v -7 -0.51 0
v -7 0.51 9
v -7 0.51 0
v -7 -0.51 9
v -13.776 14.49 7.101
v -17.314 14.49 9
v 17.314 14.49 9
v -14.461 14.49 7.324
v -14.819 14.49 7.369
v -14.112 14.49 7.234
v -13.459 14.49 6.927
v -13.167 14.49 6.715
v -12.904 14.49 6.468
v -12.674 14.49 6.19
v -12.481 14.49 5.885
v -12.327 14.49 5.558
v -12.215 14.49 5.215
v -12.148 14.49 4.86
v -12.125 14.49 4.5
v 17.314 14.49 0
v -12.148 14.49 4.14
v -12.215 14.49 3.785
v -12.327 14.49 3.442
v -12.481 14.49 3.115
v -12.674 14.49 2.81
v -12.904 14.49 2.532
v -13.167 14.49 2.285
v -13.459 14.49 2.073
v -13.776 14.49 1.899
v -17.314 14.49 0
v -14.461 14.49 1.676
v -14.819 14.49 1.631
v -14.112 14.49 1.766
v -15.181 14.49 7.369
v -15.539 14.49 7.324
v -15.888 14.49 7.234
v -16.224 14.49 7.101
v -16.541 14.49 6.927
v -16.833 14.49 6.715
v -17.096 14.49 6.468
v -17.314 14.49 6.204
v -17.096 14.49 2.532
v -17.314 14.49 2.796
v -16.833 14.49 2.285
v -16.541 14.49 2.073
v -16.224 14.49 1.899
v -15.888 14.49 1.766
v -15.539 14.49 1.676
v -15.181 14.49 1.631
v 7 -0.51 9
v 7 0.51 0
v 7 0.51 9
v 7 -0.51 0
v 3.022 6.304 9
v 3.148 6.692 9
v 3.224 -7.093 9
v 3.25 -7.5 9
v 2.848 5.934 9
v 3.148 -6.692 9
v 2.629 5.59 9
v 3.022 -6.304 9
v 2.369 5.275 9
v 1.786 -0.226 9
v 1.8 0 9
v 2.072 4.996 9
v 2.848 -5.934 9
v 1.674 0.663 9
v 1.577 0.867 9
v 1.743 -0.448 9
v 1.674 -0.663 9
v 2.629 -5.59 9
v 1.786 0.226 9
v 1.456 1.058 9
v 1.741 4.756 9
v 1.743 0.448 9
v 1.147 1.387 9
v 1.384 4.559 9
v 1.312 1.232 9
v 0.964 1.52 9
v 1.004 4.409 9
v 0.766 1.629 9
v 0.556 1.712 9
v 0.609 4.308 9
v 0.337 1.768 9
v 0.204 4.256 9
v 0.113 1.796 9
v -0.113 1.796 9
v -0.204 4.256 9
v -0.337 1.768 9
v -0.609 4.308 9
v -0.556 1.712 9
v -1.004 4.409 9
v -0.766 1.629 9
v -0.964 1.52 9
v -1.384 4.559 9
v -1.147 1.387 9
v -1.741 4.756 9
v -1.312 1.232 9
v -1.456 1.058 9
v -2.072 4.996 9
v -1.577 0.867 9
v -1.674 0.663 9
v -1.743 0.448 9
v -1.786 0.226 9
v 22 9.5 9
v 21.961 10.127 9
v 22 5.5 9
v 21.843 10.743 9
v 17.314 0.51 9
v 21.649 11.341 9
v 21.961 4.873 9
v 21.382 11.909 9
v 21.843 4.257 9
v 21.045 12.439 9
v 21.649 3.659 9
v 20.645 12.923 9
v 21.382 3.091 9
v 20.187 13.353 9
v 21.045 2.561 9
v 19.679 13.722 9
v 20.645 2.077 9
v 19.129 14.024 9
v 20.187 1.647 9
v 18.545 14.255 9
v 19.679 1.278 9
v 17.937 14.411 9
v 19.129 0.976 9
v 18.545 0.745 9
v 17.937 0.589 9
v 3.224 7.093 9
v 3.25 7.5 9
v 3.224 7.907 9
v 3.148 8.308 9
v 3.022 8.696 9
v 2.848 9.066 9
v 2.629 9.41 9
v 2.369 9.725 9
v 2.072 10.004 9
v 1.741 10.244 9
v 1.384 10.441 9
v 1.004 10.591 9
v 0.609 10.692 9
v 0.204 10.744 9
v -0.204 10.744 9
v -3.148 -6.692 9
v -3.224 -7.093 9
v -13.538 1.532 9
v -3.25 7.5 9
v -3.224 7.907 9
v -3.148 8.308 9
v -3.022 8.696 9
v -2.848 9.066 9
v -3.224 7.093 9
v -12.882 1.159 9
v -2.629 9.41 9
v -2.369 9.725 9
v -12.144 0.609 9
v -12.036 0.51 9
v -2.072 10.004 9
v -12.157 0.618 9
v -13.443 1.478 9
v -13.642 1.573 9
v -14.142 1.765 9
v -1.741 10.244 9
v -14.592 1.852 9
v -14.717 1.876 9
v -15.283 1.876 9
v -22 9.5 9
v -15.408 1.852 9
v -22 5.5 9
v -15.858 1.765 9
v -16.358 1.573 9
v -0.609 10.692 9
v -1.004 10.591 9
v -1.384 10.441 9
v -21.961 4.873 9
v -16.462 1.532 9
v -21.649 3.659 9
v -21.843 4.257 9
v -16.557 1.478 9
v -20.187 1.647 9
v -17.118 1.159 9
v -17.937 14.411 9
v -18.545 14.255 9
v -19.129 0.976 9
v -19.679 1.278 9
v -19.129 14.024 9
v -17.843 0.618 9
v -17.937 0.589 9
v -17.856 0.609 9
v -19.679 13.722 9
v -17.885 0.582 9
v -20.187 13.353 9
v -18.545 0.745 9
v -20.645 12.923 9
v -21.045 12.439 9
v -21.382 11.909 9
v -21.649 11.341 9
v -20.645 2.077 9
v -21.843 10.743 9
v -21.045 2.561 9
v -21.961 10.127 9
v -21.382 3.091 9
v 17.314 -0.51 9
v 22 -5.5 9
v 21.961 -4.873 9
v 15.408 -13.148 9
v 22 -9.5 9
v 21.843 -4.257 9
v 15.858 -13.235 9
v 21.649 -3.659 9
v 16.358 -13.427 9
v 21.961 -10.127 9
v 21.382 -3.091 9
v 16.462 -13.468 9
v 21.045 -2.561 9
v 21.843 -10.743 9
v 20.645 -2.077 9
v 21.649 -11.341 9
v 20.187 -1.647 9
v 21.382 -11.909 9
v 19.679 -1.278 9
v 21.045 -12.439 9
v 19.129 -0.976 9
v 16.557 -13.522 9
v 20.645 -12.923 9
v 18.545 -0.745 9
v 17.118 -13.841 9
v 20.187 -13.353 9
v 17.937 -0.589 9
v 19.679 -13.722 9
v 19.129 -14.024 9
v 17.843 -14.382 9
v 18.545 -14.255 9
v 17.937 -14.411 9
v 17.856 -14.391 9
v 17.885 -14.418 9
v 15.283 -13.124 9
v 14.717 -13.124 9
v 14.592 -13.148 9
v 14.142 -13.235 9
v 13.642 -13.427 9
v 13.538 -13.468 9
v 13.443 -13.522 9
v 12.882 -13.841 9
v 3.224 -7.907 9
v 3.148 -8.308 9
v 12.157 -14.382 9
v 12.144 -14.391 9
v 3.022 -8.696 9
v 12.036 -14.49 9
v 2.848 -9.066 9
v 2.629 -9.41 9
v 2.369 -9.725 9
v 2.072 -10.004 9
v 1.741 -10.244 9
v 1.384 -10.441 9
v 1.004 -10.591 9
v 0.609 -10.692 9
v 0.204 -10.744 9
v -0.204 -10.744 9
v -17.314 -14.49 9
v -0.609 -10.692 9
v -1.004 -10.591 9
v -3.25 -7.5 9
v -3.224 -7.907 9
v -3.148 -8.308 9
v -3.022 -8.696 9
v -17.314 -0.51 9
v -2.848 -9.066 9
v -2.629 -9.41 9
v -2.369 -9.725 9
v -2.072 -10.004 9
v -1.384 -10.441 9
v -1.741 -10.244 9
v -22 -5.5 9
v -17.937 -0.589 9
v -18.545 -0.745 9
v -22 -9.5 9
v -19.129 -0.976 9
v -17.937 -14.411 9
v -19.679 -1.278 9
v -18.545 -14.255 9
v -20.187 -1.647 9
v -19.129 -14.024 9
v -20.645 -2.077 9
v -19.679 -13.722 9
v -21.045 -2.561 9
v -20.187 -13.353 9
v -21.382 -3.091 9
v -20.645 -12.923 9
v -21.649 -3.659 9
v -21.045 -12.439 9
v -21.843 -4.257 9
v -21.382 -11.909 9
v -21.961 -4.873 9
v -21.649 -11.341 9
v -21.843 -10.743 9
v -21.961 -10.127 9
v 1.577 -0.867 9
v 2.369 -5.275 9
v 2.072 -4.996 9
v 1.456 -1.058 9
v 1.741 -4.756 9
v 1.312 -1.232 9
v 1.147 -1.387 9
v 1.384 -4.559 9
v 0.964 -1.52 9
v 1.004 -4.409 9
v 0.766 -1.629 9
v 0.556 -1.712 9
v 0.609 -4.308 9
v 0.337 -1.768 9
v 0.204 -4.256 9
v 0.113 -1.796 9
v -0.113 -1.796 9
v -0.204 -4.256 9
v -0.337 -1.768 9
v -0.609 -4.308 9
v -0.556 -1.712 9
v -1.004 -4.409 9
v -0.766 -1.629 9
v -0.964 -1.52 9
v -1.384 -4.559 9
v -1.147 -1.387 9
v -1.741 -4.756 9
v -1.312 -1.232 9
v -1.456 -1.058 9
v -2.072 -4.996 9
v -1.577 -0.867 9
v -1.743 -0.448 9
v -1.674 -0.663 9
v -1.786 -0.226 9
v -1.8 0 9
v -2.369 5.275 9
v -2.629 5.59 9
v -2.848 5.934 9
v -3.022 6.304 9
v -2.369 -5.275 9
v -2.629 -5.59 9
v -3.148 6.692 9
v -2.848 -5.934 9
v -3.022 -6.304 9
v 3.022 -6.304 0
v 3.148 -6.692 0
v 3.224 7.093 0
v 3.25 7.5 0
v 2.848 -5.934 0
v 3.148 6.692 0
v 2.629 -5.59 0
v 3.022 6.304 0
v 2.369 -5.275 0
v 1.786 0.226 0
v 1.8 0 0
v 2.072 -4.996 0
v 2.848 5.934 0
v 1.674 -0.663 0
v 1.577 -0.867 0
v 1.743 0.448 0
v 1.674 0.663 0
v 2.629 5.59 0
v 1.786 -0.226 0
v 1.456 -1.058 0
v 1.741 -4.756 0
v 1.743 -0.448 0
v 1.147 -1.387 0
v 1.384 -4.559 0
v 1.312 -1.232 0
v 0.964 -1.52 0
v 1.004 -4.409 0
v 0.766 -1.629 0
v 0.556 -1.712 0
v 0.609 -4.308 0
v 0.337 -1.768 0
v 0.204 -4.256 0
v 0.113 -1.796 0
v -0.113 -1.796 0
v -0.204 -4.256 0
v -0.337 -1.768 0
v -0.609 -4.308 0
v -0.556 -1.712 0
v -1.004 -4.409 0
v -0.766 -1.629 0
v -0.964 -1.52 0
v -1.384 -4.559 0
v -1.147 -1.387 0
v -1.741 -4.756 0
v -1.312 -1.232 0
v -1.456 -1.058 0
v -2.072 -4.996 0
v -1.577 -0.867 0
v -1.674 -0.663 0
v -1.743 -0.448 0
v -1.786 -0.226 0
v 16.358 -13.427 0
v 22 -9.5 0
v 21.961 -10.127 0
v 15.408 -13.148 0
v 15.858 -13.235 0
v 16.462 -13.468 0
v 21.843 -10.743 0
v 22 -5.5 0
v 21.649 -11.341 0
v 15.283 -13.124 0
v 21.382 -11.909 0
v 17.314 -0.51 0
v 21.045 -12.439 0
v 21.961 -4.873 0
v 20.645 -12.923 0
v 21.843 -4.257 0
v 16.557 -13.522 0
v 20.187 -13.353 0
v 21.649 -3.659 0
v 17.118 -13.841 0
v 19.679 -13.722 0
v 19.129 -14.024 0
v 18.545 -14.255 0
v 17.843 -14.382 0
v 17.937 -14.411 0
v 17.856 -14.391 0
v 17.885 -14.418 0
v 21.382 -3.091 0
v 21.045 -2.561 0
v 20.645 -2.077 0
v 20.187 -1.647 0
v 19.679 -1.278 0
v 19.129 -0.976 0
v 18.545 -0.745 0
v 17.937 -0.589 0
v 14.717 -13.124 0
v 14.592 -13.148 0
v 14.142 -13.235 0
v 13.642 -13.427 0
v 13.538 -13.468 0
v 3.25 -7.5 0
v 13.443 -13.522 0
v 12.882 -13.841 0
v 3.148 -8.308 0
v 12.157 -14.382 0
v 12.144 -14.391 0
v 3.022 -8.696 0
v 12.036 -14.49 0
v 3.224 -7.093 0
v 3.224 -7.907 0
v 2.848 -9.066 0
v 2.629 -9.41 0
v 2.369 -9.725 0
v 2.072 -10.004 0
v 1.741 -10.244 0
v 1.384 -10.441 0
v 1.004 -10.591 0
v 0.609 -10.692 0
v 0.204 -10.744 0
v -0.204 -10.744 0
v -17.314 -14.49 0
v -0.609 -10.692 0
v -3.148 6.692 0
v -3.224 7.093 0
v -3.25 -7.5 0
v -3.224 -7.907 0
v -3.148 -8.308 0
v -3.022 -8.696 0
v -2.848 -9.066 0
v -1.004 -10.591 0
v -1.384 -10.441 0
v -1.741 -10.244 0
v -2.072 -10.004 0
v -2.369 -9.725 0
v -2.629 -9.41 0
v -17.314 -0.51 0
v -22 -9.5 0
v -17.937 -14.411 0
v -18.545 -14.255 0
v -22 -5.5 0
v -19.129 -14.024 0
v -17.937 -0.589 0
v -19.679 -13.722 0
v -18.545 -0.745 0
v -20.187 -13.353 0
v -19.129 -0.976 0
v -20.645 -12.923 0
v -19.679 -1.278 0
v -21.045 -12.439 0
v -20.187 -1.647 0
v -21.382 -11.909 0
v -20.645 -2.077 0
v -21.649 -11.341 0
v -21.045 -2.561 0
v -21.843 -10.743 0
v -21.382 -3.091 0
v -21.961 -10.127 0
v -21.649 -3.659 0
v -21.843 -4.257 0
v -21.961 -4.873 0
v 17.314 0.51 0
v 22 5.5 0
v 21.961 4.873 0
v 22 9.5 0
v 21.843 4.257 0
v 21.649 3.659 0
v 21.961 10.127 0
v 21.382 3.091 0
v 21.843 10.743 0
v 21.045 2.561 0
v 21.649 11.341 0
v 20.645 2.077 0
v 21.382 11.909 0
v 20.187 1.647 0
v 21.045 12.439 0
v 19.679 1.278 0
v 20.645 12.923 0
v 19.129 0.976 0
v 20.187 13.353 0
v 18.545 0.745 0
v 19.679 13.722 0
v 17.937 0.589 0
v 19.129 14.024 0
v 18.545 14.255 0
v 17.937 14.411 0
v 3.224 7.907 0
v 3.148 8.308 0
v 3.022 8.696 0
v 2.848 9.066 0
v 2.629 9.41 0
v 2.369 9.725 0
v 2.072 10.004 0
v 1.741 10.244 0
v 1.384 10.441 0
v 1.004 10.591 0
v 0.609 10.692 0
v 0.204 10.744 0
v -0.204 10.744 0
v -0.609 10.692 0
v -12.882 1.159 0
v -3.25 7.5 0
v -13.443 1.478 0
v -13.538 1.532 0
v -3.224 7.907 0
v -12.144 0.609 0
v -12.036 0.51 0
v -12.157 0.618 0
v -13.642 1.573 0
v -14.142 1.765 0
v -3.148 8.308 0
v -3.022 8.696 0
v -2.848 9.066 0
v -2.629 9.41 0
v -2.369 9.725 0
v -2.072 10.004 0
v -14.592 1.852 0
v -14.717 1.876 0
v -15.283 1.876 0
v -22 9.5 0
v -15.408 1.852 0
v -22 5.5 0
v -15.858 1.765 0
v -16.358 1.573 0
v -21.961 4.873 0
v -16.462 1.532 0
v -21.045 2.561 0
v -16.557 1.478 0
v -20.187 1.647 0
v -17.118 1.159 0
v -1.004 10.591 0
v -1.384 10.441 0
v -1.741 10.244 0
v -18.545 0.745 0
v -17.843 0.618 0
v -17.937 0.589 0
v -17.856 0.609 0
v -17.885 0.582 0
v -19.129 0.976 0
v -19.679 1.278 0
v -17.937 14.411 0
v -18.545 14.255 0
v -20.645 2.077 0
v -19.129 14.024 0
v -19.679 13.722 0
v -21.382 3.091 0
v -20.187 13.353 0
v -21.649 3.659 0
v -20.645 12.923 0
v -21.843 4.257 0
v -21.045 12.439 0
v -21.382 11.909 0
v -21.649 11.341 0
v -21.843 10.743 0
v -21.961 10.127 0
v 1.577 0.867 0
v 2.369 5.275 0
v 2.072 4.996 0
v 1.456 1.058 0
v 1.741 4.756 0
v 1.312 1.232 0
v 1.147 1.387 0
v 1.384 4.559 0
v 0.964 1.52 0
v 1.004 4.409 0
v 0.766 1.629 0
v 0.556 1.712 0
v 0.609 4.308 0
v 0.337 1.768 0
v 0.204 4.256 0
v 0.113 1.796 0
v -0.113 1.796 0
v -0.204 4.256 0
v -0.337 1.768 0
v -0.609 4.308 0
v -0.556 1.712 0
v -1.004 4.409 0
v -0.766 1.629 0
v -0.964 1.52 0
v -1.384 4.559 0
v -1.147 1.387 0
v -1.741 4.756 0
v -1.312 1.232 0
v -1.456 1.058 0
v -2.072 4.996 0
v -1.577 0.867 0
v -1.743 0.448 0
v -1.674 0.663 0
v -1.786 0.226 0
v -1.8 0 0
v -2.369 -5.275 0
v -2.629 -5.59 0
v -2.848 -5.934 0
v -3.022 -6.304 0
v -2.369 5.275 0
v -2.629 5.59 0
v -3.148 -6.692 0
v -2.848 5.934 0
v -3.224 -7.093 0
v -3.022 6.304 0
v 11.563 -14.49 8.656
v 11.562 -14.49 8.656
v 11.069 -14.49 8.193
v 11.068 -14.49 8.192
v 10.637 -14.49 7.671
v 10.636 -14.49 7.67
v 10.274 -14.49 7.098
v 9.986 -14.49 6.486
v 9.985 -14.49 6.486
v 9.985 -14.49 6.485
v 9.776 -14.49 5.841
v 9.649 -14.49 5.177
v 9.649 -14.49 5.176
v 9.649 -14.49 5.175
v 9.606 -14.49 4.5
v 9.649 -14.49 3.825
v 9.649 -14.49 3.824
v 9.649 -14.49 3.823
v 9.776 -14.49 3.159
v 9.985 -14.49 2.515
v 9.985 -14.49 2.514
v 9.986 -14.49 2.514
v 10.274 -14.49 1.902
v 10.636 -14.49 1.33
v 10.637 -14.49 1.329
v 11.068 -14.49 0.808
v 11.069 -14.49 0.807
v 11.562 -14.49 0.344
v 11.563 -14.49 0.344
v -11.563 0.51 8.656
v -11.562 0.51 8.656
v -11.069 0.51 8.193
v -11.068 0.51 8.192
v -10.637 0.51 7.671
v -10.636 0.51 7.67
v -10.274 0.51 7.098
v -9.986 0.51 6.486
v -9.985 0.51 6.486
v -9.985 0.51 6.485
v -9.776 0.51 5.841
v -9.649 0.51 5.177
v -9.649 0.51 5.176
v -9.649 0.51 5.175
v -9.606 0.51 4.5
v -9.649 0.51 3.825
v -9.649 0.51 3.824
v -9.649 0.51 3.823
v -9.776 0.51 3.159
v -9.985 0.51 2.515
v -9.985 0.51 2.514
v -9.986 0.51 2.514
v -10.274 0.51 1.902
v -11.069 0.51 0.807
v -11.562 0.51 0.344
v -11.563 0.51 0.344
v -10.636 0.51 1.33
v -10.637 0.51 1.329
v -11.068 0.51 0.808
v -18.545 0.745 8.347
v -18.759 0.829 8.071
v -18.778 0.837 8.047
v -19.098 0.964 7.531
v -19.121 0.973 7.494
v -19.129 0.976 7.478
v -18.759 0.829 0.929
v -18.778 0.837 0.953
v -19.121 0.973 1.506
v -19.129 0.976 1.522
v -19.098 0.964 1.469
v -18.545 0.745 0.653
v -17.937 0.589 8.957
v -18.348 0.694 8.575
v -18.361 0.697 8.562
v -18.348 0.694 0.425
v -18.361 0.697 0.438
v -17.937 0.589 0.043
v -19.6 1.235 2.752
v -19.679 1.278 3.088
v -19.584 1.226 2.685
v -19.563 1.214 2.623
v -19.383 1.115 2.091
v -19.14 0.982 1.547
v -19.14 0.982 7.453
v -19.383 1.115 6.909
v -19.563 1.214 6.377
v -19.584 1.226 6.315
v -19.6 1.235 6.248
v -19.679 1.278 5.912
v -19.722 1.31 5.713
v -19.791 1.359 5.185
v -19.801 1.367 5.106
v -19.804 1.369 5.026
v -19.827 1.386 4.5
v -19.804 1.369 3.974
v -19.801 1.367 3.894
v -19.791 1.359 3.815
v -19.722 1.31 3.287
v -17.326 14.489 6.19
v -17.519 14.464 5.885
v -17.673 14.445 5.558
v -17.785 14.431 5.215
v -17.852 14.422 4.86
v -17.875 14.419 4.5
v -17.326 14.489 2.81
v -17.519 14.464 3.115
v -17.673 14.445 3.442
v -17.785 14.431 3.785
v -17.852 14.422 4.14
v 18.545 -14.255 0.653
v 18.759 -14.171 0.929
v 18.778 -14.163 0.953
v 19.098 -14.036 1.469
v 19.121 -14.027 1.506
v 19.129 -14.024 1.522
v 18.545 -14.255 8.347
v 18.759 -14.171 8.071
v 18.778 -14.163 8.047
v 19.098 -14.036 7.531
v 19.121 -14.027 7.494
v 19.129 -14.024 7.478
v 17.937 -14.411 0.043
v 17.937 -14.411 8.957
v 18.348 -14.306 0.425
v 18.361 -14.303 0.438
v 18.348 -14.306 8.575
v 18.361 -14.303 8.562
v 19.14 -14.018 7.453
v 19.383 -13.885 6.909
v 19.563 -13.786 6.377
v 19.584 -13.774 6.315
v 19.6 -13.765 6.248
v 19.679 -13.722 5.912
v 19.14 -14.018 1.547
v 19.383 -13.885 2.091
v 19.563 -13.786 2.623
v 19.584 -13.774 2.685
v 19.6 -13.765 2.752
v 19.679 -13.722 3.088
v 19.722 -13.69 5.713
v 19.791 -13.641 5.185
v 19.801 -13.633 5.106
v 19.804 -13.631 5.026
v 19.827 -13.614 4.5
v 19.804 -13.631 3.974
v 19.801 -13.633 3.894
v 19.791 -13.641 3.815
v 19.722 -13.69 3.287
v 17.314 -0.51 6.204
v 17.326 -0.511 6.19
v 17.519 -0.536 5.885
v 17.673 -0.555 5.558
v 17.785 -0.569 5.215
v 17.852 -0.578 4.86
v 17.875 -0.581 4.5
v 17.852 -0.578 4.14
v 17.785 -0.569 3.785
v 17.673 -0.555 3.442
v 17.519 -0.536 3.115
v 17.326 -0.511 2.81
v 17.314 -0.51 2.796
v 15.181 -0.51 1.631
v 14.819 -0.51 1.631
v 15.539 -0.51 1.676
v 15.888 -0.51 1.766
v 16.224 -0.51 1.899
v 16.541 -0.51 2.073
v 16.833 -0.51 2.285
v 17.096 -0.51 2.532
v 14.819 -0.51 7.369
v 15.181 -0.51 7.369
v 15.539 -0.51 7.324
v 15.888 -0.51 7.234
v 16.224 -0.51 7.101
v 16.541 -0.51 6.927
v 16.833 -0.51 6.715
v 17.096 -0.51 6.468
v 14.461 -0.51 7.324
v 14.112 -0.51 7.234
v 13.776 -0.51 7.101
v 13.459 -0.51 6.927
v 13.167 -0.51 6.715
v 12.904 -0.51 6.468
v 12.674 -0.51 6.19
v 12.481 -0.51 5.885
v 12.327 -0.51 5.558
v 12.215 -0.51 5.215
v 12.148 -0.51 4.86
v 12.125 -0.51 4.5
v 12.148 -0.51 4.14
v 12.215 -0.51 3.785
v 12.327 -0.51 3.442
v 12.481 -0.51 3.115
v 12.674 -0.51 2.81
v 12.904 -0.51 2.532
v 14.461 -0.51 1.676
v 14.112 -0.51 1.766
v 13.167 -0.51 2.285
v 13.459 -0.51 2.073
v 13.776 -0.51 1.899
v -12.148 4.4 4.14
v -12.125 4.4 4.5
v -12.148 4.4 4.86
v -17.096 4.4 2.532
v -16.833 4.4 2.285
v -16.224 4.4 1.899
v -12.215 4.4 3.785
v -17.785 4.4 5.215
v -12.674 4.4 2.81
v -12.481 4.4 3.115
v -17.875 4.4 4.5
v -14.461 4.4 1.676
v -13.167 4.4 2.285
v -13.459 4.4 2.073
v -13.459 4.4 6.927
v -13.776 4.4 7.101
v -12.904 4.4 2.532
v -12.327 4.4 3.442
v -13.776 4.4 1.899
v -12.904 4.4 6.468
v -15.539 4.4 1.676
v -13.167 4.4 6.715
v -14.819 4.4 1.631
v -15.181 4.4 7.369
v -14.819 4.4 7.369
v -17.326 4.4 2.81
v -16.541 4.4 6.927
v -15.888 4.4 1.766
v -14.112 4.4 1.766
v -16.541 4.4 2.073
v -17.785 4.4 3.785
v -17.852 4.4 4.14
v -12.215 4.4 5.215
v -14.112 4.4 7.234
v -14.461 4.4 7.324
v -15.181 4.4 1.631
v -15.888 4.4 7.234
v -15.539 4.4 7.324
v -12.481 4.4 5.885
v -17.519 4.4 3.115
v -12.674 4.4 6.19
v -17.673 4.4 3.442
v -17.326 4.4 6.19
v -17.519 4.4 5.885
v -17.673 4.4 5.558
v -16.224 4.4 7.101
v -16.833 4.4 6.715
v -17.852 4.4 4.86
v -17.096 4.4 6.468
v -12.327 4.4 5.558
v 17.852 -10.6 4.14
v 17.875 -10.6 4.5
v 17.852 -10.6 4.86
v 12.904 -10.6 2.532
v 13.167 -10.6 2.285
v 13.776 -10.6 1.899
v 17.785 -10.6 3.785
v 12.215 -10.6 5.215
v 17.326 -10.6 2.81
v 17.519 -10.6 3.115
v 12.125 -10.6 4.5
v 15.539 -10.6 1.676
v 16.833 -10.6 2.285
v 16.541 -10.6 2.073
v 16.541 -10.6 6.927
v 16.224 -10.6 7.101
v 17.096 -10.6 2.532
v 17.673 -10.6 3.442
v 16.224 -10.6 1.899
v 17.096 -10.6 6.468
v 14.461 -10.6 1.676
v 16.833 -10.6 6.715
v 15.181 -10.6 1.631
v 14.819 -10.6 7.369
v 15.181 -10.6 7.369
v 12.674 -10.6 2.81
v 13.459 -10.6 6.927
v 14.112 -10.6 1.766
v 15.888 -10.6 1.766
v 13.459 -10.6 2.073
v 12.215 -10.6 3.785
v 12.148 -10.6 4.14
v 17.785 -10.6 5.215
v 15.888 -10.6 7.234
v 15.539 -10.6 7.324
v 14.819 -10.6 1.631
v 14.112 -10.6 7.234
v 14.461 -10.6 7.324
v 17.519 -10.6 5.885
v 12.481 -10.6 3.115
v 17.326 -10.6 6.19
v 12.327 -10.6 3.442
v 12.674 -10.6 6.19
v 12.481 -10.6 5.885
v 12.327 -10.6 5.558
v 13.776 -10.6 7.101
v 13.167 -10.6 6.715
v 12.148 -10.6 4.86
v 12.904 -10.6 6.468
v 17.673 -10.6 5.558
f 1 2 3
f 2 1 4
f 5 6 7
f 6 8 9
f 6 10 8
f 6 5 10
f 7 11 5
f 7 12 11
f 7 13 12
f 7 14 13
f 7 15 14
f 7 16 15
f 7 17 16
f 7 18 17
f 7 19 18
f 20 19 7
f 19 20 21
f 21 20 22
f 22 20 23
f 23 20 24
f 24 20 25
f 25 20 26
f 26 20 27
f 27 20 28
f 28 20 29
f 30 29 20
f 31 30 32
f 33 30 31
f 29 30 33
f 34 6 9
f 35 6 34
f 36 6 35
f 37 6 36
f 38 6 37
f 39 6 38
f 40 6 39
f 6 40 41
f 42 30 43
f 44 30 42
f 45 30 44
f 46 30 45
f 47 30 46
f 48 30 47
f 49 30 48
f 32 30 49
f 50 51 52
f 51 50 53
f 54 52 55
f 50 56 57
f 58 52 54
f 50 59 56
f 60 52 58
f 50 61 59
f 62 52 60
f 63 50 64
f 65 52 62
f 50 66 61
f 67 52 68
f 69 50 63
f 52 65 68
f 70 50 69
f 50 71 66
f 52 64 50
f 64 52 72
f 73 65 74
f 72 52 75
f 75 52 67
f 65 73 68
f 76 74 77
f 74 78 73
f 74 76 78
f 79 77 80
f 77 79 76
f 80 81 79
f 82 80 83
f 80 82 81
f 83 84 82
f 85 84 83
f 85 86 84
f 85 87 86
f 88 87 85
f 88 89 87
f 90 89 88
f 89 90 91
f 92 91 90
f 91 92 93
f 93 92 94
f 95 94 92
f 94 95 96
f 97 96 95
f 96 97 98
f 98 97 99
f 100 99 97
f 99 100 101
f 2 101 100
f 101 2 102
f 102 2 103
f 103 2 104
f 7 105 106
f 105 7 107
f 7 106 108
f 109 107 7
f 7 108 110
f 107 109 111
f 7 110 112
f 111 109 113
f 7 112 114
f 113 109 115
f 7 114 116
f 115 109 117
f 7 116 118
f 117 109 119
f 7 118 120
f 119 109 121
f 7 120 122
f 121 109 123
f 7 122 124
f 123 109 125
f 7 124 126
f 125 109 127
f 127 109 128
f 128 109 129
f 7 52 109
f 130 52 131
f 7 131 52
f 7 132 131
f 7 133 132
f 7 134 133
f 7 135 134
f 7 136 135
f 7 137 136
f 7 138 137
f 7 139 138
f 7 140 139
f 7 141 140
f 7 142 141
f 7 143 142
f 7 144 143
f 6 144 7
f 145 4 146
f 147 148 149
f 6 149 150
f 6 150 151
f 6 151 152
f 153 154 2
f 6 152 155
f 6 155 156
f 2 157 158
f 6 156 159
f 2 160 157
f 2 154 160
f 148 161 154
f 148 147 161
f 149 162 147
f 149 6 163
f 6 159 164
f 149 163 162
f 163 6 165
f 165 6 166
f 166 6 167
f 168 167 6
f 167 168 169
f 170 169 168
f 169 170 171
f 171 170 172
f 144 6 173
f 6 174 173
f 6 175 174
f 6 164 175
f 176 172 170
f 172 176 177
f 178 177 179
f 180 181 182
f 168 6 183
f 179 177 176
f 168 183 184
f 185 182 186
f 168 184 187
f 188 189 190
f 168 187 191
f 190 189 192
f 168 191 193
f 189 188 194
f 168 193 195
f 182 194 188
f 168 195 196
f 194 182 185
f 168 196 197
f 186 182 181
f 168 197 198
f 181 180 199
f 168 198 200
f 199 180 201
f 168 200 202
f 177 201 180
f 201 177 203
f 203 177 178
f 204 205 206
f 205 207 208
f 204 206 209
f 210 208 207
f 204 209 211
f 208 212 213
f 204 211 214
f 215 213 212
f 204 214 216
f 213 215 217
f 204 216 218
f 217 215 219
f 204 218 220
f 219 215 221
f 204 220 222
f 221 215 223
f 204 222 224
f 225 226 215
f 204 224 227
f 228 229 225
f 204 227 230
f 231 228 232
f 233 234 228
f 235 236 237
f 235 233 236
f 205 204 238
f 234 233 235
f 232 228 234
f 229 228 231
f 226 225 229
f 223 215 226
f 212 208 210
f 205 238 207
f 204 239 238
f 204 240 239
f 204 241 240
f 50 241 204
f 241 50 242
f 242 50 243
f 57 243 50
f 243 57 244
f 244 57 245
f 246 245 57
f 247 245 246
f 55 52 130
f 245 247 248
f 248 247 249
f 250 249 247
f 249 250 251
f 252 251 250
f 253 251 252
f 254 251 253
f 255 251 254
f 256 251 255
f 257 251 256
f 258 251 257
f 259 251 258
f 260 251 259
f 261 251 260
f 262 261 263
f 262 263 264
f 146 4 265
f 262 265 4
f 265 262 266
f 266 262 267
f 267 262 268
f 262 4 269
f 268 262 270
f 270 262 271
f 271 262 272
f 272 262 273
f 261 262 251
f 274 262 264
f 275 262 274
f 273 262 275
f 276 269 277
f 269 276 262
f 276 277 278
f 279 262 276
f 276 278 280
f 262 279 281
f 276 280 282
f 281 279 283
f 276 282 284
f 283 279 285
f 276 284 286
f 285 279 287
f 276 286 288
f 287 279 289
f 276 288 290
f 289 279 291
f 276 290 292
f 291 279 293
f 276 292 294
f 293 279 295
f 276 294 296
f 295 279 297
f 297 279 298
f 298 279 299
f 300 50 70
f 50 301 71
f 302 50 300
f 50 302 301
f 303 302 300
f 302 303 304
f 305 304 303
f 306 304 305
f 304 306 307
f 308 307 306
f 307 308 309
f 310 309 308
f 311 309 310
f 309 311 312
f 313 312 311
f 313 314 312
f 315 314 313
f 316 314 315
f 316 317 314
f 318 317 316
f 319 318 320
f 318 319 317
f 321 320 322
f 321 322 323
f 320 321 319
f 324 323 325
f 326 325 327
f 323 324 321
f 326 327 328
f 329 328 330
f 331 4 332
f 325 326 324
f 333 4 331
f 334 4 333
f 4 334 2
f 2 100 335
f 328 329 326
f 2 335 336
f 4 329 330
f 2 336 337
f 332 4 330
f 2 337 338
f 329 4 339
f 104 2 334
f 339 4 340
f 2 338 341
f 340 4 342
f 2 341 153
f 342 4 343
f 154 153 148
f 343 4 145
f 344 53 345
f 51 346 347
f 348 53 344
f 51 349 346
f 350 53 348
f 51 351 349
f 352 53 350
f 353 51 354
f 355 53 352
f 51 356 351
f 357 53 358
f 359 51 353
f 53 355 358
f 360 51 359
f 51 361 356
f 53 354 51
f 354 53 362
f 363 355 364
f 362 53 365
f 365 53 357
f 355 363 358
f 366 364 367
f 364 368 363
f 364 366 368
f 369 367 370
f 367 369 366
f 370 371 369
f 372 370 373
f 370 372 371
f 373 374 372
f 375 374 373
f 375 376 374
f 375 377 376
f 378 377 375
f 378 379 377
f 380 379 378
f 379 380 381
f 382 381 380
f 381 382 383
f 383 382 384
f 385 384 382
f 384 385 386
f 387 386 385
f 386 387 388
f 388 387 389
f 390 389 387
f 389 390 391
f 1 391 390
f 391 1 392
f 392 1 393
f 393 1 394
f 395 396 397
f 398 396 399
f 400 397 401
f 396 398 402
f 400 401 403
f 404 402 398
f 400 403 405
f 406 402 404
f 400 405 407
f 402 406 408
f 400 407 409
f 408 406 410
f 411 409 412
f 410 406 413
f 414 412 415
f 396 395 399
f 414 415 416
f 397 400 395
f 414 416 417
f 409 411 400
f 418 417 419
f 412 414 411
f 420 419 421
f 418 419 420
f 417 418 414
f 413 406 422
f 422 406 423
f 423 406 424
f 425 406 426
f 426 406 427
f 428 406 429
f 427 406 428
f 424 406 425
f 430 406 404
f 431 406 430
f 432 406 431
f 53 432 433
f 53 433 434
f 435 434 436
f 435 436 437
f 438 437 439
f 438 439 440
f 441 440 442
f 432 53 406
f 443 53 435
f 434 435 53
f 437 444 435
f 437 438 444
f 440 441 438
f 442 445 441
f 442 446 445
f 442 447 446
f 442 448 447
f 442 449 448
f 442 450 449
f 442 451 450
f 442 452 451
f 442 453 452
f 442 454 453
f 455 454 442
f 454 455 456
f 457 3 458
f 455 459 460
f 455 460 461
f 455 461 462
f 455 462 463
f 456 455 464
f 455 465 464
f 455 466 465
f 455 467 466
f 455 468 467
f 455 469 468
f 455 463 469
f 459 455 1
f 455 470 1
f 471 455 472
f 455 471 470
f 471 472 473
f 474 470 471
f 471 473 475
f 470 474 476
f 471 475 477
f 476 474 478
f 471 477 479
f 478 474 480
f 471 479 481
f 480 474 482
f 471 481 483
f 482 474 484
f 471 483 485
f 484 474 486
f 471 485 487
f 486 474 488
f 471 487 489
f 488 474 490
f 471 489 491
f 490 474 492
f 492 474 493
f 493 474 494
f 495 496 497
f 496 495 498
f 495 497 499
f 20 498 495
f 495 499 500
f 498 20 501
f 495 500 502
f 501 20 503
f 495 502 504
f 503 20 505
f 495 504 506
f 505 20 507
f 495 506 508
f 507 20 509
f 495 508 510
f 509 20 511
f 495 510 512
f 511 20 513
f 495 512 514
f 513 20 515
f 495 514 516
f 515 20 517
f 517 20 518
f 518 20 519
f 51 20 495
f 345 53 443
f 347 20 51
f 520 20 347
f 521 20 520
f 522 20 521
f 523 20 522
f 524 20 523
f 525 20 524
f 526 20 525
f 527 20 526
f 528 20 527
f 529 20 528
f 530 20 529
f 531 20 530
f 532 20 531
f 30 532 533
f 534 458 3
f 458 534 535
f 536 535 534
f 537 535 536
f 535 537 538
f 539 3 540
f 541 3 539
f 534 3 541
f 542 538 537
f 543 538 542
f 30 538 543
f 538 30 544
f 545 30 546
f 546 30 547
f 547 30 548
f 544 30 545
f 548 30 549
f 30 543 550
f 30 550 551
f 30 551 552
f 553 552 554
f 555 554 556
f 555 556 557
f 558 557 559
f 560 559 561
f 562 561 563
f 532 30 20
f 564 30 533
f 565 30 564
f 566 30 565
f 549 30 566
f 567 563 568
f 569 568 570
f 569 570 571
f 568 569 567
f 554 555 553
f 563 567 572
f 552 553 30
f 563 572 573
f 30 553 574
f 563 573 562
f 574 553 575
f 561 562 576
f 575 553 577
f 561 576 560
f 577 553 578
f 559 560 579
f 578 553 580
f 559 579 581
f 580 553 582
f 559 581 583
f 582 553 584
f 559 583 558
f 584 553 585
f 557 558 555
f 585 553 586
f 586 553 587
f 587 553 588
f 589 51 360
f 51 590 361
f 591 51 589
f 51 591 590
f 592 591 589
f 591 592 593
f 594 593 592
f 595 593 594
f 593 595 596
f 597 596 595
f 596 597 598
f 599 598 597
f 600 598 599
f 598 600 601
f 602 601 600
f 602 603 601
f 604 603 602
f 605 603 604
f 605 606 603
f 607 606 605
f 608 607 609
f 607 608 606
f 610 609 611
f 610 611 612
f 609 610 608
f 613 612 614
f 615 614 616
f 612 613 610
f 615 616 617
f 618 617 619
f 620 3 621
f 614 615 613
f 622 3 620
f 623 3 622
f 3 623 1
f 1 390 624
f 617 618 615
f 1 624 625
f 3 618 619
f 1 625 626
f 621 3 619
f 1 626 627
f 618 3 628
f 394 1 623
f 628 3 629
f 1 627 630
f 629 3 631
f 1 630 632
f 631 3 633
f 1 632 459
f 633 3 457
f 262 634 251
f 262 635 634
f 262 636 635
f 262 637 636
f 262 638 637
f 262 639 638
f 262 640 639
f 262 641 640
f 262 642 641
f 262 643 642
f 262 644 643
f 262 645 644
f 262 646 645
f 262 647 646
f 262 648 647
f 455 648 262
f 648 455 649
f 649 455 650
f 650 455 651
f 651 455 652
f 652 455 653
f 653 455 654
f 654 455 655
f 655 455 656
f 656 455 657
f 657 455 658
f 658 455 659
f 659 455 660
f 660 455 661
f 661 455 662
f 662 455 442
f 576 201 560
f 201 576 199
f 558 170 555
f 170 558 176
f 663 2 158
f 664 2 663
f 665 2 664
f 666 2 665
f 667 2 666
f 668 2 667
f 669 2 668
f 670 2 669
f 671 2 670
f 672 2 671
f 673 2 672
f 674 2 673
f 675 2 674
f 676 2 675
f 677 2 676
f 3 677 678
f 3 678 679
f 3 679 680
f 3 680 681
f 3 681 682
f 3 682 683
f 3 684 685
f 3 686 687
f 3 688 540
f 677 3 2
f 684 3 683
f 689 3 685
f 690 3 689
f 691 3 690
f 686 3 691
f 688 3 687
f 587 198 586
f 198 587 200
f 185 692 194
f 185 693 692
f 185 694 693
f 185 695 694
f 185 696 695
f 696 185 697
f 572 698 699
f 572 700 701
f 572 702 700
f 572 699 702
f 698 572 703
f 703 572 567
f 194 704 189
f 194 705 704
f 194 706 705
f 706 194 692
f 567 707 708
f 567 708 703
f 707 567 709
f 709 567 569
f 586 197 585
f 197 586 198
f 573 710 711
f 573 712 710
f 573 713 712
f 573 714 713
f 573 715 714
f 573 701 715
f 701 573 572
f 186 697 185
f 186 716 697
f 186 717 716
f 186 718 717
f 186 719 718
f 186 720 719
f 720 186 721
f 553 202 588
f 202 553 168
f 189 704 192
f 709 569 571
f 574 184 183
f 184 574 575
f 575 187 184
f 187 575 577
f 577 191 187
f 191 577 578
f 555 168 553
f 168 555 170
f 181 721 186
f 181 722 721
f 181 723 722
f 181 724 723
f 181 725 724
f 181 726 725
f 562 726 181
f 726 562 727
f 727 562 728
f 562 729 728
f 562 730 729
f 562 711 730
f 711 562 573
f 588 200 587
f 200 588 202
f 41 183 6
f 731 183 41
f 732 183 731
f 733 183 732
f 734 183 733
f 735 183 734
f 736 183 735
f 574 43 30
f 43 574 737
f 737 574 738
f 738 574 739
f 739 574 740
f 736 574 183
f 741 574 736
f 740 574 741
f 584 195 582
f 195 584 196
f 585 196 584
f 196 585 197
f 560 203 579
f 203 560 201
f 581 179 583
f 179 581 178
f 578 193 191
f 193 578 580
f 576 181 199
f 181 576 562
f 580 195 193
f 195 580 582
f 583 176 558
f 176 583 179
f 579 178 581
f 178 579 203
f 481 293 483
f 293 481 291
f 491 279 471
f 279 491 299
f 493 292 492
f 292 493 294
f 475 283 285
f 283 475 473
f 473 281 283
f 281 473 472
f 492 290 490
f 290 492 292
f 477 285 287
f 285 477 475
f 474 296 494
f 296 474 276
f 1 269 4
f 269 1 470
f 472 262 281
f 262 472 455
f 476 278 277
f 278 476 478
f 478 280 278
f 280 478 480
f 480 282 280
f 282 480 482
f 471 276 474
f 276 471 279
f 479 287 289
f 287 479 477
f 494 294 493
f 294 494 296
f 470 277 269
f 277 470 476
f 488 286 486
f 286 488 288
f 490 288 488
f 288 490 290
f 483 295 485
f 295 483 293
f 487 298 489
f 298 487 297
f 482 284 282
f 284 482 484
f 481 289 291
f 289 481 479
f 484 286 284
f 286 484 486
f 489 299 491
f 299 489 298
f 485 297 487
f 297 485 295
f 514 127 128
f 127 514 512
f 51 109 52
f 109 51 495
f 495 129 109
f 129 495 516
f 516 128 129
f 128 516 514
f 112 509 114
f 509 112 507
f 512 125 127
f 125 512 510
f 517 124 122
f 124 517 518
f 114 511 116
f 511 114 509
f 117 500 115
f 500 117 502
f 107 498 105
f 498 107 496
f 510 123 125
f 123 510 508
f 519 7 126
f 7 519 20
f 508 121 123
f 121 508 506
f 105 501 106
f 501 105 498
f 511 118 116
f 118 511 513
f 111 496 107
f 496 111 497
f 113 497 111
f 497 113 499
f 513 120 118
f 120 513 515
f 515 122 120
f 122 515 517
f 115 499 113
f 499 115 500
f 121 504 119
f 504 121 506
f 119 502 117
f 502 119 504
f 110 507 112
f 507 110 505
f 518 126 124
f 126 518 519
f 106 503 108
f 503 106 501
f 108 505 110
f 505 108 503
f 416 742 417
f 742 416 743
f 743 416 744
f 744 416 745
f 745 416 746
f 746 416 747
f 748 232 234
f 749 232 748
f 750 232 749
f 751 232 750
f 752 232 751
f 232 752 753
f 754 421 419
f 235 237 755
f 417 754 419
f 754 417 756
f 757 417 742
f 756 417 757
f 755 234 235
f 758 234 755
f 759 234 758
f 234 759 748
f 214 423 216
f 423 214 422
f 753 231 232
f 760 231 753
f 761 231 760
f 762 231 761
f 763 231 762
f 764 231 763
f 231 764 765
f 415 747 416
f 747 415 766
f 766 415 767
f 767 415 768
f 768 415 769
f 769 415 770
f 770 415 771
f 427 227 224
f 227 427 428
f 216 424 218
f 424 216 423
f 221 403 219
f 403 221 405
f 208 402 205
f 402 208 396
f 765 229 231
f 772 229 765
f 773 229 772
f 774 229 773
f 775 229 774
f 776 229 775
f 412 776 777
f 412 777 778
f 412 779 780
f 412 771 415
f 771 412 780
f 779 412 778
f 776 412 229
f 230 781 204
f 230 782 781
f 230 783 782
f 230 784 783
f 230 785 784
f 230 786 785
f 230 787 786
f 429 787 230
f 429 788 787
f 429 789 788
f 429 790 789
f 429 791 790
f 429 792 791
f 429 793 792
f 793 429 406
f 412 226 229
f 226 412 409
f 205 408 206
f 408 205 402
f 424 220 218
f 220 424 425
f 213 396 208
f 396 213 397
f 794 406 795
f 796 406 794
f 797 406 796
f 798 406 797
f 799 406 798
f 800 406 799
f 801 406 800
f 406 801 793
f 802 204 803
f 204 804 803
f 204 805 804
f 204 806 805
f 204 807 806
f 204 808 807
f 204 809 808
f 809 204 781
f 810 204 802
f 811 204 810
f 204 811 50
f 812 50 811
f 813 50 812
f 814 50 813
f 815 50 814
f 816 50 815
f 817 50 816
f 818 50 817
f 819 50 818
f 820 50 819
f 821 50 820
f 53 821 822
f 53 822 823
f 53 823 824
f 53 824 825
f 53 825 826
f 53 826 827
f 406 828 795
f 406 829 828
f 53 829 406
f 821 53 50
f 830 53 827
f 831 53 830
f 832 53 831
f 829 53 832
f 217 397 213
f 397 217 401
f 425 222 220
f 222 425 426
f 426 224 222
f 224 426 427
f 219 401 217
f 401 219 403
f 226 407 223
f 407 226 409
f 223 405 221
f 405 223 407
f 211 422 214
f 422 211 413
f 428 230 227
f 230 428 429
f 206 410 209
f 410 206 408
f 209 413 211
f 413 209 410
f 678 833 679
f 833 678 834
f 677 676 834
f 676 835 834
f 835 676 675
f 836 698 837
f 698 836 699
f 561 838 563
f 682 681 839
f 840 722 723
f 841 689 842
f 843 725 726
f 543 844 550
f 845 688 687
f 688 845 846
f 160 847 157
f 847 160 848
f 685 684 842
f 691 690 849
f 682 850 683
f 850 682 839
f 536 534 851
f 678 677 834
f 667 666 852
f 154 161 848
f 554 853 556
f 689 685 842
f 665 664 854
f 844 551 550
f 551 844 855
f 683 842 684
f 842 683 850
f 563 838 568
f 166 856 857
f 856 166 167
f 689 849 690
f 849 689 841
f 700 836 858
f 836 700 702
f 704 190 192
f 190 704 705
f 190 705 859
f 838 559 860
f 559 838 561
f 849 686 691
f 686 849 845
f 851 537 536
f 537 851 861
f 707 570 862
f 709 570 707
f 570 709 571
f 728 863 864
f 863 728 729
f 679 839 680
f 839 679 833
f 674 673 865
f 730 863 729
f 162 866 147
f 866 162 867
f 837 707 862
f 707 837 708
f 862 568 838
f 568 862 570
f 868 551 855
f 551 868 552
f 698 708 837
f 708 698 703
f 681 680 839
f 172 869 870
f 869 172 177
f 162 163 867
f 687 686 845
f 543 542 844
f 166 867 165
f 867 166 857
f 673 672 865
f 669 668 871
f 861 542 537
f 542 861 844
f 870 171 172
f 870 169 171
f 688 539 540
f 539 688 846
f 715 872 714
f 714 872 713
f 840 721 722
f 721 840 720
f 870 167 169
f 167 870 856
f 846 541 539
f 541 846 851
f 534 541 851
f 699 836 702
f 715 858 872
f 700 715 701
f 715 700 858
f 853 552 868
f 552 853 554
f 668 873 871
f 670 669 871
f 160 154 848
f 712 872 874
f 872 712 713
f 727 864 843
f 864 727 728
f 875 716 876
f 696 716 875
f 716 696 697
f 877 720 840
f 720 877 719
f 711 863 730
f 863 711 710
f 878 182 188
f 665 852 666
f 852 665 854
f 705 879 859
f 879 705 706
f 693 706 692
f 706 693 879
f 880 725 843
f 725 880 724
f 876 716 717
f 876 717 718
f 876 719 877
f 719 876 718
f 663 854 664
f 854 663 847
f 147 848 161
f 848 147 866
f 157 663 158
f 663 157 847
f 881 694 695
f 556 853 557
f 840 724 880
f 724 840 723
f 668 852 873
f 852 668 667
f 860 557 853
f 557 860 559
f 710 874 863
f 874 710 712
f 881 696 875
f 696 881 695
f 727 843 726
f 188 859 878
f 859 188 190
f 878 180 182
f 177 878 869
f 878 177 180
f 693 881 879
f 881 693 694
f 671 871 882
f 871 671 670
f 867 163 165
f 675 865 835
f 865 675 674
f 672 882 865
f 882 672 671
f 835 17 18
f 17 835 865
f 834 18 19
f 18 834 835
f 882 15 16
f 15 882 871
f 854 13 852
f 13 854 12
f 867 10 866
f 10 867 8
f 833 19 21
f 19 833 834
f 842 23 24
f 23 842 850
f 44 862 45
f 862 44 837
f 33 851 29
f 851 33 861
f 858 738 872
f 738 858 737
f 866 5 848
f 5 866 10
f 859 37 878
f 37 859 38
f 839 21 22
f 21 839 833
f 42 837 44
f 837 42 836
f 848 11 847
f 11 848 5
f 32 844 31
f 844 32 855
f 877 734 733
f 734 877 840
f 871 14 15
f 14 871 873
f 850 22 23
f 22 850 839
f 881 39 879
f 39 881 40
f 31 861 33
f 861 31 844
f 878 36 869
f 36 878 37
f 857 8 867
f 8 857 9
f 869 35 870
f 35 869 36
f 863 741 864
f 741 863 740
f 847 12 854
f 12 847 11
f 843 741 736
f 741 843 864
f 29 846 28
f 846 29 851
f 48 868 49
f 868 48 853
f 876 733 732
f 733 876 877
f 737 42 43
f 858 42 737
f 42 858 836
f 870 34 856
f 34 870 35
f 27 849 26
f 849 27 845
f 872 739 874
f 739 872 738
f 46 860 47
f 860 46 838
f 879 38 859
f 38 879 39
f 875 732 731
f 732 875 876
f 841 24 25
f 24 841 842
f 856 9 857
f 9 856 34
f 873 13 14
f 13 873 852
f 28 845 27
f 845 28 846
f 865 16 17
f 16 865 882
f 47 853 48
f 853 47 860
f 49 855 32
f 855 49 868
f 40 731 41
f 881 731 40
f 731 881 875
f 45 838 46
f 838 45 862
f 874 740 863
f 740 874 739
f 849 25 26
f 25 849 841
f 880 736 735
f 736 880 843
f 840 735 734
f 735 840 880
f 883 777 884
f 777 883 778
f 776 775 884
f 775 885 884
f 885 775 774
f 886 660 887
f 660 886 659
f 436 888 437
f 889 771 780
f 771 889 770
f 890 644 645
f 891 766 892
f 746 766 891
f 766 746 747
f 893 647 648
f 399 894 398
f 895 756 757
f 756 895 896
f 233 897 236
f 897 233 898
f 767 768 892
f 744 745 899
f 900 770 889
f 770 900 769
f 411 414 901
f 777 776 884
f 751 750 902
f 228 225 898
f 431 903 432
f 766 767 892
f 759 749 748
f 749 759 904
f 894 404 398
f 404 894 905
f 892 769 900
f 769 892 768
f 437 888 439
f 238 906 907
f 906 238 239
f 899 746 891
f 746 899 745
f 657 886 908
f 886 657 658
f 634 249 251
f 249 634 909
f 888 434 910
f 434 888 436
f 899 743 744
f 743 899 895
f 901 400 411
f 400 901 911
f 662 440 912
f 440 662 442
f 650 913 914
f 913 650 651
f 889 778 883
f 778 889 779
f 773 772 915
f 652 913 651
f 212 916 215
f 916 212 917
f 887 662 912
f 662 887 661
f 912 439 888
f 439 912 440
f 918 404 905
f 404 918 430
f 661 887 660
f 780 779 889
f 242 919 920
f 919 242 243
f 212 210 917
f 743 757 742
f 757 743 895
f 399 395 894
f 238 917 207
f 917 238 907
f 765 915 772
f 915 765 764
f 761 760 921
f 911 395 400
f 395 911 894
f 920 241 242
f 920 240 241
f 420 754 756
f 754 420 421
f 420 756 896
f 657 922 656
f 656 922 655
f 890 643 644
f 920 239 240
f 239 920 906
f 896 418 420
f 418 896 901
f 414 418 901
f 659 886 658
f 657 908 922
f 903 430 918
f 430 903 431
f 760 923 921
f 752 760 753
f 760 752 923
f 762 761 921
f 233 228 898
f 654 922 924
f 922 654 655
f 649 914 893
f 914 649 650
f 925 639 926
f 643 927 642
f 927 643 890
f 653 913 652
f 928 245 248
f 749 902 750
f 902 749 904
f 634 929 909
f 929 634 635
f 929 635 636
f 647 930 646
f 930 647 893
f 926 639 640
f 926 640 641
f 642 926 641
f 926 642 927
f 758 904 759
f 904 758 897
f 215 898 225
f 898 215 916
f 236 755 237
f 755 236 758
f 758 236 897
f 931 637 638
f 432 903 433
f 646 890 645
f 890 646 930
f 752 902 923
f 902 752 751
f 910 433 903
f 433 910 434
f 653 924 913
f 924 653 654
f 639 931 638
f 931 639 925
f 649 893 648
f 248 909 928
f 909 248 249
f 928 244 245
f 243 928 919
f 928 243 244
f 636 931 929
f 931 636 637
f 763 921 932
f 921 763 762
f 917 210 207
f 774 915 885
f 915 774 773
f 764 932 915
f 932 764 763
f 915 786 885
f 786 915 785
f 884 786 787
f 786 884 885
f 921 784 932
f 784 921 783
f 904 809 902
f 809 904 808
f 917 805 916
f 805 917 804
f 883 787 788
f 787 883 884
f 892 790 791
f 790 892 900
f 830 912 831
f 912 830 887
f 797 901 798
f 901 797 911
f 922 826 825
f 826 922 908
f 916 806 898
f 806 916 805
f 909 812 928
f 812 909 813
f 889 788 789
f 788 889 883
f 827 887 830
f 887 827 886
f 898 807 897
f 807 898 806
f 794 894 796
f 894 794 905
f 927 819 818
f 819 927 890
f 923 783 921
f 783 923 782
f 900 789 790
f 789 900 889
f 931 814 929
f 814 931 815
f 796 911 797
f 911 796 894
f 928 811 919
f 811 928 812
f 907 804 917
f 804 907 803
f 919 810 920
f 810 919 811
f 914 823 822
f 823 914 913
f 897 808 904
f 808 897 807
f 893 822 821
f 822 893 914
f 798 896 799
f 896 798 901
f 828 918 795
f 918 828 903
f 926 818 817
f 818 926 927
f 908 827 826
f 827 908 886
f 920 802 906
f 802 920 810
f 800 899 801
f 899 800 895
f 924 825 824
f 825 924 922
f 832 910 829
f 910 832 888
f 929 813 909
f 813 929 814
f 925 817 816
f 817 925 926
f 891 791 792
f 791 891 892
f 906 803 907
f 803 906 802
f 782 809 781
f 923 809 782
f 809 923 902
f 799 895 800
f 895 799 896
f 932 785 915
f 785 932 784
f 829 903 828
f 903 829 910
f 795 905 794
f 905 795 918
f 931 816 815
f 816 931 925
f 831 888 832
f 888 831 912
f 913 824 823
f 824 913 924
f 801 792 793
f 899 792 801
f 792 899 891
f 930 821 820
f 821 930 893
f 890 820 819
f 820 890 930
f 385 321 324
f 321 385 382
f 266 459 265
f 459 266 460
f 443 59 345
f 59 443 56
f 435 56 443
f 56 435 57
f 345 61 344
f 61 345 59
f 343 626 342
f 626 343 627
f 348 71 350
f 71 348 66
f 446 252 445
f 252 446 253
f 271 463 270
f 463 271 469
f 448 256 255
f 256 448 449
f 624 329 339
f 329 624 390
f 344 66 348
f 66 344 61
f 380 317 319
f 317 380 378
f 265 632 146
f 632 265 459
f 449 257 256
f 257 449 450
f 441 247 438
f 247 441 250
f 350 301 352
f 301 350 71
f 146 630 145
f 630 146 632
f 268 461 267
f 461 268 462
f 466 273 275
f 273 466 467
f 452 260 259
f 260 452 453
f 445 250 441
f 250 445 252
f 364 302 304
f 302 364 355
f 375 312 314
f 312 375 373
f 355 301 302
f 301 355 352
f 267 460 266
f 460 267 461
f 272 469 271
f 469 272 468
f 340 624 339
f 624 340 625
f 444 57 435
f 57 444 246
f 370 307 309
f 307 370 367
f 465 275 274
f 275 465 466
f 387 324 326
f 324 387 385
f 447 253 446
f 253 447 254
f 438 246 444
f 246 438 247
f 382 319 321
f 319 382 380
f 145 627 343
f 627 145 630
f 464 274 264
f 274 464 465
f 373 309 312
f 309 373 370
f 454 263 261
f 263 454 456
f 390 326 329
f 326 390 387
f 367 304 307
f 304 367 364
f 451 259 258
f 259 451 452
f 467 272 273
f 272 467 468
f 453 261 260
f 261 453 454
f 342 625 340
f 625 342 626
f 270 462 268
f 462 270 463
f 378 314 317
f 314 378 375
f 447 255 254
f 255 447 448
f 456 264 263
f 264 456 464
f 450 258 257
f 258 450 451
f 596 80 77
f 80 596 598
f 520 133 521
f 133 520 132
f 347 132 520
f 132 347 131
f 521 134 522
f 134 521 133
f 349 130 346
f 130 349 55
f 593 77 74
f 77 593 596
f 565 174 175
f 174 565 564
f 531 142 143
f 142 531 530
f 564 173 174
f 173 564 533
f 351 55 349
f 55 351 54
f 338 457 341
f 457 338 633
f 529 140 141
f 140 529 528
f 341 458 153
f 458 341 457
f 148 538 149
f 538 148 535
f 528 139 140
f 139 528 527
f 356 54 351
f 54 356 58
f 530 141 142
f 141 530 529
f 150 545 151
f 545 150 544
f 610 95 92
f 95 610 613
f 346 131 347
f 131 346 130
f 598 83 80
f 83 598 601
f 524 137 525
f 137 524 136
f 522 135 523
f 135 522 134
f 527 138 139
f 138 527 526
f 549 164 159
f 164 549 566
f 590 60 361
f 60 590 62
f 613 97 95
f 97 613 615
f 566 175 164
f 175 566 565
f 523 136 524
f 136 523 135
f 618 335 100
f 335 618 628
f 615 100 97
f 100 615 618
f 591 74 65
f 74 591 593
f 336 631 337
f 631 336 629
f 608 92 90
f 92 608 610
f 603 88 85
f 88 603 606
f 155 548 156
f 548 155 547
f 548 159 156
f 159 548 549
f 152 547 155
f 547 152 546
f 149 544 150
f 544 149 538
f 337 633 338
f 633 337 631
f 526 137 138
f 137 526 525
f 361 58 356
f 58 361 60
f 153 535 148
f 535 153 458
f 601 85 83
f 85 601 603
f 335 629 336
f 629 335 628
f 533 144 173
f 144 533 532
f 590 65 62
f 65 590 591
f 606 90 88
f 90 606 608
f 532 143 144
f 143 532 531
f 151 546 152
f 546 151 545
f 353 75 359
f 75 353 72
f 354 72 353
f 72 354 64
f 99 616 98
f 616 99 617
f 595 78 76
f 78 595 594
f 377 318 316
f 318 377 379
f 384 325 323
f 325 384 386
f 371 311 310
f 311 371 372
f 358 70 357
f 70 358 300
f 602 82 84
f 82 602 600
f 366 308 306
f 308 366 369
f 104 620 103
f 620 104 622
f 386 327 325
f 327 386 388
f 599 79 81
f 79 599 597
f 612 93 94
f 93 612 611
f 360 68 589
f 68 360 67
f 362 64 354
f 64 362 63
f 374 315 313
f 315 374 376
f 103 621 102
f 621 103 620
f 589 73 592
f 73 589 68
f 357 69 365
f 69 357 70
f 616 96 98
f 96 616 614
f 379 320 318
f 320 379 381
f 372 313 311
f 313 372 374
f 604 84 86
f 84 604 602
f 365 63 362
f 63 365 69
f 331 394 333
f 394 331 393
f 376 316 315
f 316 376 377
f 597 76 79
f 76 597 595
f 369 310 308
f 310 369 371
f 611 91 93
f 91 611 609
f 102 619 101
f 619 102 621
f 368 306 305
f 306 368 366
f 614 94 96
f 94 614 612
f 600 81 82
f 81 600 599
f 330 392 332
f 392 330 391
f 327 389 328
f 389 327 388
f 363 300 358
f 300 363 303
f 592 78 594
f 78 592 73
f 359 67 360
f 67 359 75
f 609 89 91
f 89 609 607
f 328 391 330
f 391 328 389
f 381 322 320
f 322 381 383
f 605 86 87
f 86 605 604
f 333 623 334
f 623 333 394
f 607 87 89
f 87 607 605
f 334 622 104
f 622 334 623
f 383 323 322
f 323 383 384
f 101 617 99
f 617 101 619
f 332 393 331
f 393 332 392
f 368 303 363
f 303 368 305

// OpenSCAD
$fn = 50;


difference() {
	union() {
		hull() {
			translate(v = [-2.0000000000, 9.5000000000, 0]) {
				cylinder(h = 9, r = 5);
			}
			translate(v = [2.0000000000, 9.5000000000, 0]) {
				cylinder(h = 9, r = 5);
			}
			translate(v = [-2.0000000000, -9.5000000000, 0]) {
				cylinder(h = 9, r = 5);
			}
			translate(v = [2.0000000000, -9.5000000000, 0]) {
				cylinder(h = 9, r = 5);
			}
		}
		translate(v = [-7.5000000000, 7.5000000000, 0]) {
			hull() {
				translate(v = [-9.5000000000, 2.0000000000, 0]) {
					cylinder(h = 9, r = 5);
				}
				translate(v = [9.5000000000, 2.0000000000, 0]) {
					cylinder(h = 9, r = 5);
				}
				translate(v = [-9.5000000000, -2.0000000000, 0]) {
					cylinder(h = 9, r = 5);
				}
				translate(v = [9.5000000000, -2.0000000000, 0]) {
					cylinder(h = 9, r = 5);
				}
			}
		}
		translate(v = [-7.5000000000, -7.5000000000, 0]) {
			hull() {
				translate(v = [-9.5000000000, 2.0000000000, 0]) {
					cylinder(h = 9, r = 5);
				}
				translate(v = [9.5000000000, 2.0000000000, 0]) {
					cylinder(h = 9, r = 5);
				}
				translate(v = [-9.5000000000, -2.0000000000, 0]) {
					cylinder(h = 9, r = 5);
				}
				translate(v = [9.5000000000, -2.0000000000, 0]) {
					cylinder(h = 9, r = 5);
				}
			}
		}
		translate(v = [7.5000000000, 7.5000000000, 0]) {
			hull() {
				translate(v = [-9.5000000000, 2.0000000000, 0]) {
					cylinder(h = 9, r = 5);
				}
				translate(v = [9.5000000000, 2.0000000000, 0]) {
					cylinder(h = 9, r = 5);
				}
				translate(v = [-9.5000000000, -2.0000000000, 0]) {
					cylinder(h = 9, r = 5);
				}
				translate(v = [9.5000000000, -2.0000000000, 0]) {
					cylinder(h = 9, r = 5);
				}
			}
		}
		translate(v = [7.5000000000, -7.5000000000, 0]) {
			hull() {
				translate(v = [-9.5000000000, 2.0000000000, 0]) {
					cylinder(h = 9, r = 5);
				}
				translate(v = [9.5000000000, 2.0000000000, 0]) {
					cylinder(h = 9, r = 5);
				}
				translate(v = [-9.5000000000, -2.0000000000, 0]) {
					cylinder(h = 9, r = 5);
				}
				translate(v = [9.5000000000, -2.0000000000, 0]) {
					cylinder(h = 9, r = 5);
				}
			}
		}
	}
	union() {
		translate(v = [-15.0000000000, 0.5000000000, 4.5000000000]) {
			rotate(a = [90, 0, 0]) {
				difference() {
					union() {
						#translate(v = [0, 0, -14.0000000000]) {
							cylinder(h = 14, r = 2.6000000000);
						}
						#translate(v = [0, 0, -3.9000000000]) {
							cylinder(h = 3.9000000000, r1 = 2.8750000000, r2 = 5.4000000000);
						}
						#translate(v = [0, 0, -14.0000000000]) {
							cylinder(h = 14, r = 2.8750000000);
						}
						#translate(v = [0, 0, -14.0000000000]) {
							cylinder(h = 14, r = 2.6000000000);
						}
					}
					union();
				}
			}
		}
		translate(v = [15.0000000000, -14.5000000000, 4.5000000000]) {
			rotate(a = [90, 0, 0]) {
				difference() {
					union() {
						#translate(v = [0, 0, -14.0000000000]) {
							cylinder(h = 14, r = 2.6000000000);
						}
						#translate(v = [0, 0, -3.9000000000]) {
							cylinder(h = 3.9000000000, r1 = 2.8750000000, r2 = 5.4000000000);
						}
						#translate(v = [0, 0, -14.0000000000]) {
							cylinder(h = 14, r = 2.8750000000);
						}
						#translate(v = [0, 0, -14.0000000000]) {
							cylinder(h = 14, r = 2.6000000000);
						}
					}
					union();
				}
			}
		}
		translate(v = [0.0000000000, -7.5000000000, 0]) {
			translate(v = [0, 0, -100]) {
				cylinder(h = 200, r = 3.2500000000);
			}
		}
		translate(v = [0.0000000000, 7.5000000000, 0]) {
			translate(v = [0, 0, -100]) {
				cylinder(h = 200, r = 3.2500000000);
			}
		}
		translate(v = [0.0000000000, -7.5000000000, 0]) {
			translate(v = [0, 0, -100]) {
				cylinder(h = 200, r = 1.8000000000);
			}
		}
		translate(v = [0, 0, -100]) {
			cylinder(h = 200, r = 1.8000000000);
		}
		translate(v = [0.0000000000, 7.5000000000, 0]) {
			translate(v = [0, 0, -100]) {
				cylinder(h = 200, r = 1.8000000000);
			}
		}
	}
}
